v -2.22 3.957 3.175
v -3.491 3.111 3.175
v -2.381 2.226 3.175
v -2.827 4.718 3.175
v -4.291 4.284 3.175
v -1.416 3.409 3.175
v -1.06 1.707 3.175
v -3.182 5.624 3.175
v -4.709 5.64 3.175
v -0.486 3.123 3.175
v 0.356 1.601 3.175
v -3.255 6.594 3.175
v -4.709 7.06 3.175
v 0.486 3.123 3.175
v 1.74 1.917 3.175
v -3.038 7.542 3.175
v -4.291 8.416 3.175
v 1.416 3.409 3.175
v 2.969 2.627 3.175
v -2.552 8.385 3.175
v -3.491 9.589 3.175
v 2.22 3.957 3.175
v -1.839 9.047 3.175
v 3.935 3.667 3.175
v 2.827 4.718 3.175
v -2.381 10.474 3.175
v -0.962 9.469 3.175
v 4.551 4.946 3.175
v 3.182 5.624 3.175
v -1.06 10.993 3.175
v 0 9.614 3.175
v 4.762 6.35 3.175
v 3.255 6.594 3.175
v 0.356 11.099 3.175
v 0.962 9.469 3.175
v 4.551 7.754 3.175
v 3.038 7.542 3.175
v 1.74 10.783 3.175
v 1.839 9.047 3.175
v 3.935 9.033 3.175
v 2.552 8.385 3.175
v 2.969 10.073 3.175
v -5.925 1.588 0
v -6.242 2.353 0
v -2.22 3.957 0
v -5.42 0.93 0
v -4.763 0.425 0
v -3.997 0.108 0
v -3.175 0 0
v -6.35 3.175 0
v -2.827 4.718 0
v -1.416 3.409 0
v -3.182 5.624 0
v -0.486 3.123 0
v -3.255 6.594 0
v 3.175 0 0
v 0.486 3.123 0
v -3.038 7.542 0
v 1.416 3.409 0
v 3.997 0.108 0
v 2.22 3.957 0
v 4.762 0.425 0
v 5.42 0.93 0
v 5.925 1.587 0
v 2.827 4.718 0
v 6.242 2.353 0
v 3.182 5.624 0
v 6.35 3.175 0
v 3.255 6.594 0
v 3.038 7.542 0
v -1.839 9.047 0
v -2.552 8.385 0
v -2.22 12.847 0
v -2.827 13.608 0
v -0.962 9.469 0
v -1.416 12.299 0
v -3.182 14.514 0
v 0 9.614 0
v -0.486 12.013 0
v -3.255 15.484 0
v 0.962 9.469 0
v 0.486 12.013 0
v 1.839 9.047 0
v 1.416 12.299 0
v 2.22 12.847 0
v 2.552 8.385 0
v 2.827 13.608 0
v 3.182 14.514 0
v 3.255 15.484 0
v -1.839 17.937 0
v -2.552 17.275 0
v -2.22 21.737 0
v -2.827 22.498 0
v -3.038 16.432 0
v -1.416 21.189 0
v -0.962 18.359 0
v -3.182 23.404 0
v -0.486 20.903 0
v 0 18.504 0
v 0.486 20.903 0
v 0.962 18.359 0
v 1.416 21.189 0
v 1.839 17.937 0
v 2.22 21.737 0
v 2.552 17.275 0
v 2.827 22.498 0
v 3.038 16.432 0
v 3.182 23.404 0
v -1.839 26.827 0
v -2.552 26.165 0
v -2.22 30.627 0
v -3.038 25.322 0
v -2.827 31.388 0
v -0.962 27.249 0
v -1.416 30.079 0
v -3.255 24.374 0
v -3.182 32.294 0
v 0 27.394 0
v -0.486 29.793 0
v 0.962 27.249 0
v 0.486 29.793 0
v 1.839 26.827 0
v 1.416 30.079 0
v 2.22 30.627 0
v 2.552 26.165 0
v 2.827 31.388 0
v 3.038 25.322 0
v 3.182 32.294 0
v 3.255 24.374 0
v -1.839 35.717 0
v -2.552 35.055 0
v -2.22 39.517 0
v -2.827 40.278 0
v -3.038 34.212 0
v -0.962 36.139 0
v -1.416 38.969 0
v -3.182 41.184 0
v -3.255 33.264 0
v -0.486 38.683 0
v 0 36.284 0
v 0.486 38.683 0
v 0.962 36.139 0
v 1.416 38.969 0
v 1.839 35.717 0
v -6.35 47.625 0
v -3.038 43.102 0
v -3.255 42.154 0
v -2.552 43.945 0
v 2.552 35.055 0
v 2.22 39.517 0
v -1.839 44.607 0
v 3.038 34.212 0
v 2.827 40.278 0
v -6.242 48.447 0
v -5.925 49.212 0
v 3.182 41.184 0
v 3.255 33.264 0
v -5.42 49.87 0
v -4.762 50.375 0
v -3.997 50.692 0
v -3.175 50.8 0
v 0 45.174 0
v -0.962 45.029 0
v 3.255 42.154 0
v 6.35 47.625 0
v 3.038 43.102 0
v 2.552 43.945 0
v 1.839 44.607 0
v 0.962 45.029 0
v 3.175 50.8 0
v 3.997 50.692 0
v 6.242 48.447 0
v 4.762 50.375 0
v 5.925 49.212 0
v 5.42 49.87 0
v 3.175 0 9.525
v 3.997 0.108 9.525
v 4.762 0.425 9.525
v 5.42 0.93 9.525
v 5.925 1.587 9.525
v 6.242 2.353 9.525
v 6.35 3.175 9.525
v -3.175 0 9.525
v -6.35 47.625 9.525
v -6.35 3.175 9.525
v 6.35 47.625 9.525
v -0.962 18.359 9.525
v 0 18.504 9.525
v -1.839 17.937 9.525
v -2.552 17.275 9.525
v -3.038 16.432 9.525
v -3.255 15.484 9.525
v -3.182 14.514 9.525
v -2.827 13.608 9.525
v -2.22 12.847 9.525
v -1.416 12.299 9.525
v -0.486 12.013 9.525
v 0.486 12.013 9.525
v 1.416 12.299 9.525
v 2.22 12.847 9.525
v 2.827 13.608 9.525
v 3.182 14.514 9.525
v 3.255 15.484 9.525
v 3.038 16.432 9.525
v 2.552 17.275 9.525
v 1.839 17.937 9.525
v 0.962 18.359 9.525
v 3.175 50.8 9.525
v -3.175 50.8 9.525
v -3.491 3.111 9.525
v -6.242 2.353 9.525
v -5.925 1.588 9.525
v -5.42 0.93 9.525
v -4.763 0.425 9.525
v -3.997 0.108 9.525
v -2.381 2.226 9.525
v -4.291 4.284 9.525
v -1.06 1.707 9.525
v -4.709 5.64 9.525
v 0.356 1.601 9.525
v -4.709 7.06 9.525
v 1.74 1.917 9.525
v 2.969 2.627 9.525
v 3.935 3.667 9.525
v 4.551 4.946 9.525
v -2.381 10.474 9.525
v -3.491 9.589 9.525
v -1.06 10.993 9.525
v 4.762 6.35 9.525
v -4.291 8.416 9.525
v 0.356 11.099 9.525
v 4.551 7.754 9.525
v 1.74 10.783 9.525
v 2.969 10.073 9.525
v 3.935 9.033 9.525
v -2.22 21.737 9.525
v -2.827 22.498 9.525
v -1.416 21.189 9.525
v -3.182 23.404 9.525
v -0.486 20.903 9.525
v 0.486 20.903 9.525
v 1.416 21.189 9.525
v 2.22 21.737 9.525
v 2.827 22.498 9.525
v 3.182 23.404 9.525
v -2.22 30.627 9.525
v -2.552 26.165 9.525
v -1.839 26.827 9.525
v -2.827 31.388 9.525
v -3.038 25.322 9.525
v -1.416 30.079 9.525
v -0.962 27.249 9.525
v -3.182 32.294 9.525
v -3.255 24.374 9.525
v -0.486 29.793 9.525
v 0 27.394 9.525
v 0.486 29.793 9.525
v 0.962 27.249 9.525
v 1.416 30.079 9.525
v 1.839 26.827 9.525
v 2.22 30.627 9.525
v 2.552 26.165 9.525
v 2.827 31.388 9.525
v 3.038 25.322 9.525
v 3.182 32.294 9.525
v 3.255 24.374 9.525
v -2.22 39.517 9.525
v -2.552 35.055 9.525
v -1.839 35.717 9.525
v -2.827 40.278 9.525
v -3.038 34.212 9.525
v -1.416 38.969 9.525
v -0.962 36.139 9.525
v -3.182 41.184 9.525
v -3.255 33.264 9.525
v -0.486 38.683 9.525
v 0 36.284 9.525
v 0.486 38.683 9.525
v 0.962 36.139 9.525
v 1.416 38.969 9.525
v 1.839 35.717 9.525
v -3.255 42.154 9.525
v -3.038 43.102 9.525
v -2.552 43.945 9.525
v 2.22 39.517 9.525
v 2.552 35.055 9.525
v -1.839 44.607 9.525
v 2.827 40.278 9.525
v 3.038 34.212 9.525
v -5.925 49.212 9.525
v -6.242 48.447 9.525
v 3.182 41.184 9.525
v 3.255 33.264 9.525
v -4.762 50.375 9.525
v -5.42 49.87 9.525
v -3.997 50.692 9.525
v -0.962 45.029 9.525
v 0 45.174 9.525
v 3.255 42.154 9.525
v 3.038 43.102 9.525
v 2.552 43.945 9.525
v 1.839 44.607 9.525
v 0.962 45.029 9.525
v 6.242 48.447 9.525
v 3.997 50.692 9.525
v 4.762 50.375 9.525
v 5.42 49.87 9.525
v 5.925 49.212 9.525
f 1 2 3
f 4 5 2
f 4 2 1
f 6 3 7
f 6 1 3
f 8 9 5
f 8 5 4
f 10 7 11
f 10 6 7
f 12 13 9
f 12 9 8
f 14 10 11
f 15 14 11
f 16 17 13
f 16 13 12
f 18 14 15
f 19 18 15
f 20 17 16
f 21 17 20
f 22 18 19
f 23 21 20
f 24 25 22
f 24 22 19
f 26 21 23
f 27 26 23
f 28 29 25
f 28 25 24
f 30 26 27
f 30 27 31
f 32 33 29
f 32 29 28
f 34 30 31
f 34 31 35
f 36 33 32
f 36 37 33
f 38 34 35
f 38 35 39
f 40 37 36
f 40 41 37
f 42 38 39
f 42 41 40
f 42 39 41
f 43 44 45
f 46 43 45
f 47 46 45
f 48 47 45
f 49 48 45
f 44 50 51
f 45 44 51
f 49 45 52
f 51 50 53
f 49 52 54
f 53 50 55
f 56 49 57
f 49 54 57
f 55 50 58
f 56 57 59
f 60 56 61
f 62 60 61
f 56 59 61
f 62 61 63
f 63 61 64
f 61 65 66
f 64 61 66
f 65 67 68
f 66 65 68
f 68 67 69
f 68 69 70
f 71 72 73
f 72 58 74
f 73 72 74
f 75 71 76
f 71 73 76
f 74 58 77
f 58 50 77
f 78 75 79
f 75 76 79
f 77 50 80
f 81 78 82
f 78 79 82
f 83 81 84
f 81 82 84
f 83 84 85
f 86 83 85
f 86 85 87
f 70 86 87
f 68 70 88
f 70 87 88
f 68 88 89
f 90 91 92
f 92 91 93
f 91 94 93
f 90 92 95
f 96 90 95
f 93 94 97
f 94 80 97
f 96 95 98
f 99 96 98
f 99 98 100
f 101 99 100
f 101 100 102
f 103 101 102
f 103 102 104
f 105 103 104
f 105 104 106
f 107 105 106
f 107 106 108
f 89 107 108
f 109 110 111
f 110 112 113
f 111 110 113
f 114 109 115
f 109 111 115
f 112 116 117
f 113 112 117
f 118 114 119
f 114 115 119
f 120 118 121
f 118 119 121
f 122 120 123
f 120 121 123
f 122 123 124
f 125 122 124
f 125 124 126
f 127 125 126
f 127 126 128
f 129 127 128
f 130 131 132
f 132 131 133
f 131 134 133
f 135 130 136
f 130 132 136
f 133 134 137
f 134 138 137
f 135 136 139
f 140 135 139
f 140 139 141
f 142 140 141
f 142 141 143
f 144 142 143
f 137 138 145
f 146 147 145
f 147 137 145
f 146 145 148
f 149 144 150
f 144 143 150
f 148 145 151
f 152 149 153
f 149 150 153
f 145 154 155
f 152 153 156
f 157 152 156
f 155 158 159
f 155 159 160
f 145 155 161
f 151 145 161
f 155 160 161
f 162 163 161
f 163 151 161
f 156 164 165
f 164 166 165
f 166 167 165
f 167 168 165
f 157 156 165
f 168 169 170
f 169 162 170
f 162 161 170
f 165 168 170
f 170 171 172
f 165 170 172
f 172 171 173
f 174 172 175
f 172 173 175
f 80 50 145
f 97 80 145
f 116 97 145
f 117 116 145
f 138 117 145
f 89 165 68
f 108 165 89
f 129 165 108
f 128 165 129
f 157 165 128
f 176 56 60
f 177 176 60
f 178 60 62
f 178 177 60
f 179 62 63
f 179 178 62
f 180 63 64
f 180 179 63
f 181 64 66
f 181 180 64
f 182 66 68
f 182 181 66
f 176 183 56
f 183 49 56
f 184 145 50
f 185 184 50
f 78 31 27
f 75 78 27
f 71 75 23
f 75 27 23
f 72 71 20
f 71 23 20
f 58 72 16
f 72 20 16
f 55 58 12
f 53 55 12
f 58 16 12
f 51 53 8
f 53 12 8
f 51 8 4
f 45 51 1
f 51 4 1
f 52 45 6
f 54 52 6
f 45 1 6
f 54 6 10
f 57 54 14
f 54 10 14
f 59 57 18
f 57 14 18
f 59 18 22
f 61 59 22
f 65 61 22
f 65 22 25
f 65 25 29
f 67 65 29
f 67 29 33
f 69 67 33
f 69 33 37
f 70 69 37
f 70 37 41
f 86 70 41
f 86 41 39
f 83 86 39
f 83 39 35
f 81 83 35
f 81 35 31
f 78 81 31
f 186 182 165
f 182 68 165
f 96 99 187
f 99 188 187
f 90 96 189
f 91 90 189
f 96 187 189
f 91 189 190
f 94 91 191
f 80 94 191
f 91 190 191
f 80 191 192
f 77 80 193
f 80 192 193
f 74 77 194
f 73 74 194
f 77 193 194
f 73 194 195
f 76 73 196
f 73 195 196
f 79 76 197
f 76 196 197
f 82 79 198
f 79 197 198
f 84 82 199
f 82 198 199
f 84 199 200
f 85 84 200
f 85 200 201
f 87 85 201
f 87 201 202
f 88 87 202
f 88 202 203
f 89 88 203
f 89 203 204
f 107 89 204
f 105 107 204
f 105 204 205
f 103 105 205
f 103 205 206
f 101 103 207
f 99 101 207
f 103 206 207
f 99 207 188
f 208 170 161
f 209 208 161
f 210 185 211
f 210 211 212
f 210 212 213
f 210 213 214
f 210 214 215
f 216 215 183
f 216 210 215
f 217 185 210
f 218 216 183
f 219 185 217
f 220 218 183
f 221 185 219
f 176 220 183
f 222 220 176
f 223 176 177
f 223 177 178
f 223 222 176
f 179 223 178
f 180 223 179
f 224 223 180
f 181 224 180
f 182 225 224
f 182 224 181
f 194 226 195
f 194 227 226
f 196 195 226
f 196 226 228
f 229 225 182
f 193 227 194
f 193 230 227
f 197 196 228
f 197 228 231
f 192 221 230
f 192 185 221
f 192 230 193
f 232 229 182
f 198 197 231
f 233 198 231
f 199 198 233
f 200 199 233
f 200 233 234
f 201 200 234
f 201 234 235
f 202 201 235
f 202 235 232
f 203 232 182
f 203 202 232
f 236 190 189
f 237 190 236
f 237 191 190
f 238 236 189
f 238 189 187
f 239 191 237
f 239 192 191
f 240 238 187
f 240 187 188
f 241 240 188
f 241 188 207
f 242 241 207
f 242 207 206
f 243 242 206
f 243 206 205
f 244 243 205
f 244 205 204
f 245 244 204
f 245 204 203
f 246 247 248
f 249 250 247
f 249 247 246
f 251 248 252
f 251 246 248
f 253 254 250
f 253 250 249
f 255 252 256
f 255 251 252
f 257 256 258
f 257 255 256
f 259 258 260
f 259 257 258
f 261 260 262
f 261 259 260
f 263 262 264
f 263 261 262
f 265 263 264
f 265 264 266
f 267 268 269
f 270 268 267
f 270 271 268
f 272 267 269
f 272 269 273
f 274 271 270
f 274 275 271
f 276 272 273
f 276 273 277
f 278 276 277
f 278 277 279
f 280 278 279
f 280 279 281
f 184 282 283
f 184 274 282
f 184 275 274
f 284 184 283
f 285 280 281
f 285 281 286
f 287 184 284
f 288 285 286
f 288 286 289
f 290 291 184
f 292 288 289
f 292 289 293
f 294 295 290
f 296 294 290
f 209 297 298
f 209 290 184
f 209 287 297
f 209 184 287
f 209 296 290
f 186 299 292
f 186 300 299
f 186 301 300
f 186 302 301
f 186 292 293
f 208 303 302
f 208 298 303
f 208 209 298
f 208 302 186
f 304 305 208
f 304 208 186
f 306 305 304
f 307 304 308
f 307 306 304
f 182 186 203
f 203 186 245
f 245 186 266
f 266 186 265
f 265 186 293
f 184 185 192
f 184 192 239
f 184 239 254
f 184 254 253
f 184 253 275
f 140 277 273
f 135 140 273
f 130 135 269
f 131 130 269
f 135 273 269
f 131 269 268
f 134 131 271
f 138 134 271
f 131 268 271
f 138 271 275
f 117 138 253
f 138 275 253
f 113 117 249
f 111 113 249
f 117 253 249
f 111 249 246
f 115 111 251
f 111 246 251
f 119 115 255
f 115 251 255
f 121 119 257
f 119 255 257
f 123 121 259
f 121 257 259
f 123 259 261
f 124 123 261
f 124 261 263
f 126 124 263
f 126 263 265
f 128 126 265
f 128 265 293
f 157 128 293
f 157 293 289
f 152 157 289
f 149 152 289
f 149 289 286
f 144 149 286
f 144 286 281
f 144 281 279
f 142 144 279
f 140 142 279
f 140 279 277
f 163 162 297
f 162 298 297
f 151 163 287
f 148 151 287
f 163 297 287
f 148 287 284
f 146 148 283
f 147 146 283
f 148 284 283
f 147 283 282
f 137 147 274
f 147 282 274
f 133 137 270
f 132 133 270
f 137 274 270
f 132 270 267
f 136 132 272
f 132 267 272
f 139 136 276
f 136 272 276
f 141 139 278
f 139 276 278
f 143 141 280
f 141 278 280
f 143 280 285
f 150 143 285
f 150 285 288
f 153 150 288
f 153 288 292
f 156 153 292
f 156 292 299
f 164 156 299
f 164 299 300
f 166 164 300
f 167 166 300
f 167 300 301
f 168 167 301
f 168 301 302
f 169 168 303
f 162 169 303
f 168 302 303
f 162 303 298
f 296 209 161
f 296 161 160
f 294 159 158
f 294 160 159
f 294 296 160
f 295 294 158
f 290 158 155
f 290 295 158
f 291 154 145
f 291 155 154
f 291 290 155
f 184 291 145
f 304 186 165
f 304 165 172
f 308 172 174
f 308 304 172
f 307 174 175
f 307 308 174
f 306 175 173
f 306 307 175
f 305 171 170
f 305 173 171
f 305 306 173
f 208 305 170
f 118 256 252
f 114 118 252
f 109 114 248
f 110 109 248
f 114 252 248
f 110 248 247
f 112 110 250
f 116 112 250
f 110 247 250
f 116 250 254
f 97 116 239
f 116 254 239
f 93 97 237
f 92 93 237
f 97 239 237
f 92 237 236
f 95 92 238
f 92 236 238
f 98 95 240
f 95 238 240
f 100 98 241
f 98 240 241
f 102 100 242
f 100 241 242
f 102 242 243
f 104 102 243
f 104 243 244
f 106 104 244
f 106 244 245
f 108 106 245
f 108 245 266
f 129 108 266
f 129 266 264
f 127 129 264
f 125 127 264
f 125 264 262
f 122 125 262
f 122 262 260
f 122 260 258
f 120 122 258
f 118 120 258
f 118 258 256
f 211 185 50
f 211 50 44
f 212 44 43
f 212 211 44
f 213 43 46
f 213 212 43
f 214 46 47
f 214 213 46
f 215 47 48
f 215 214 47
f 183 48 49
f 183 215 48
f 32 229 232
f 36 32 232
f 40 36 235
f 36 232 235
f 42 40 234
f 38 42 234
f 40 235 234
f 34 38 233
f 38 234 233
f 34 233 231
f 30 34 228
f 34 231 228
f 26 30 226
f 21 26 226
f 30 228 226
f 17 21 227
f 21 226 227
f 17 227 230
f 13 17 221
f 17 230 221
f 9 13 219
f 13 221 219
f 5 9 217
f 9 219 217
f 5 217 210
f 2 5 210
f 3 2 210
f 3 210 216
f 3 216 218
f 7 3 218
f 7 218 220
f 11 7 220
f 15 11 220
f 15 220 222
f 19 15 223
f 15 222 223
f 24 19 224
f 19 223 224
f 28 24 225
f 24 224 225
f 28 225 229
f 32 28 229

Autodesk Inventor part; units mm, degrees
ref_plane "YZ Plane" through (0, 0, 0) normal (1, 0, 0) x (0, 1, 0)
ref_plane "XZ Plane" through (0, 0, 0) normal (0, 1, 0) x (-1, 0, 0)
ref_plane "XY Plane" through (0, 0, 0) normal (0, 0, 1) x (1, 0, 0)
sketch "Sketch1" plane through (0, 0, 0) normal (0, 0, 1) x (1, 0, 0)
  line L0 (-6.35, 0) -> (6.35, 0)
  line L1 (6.35, 0) -> (6.35, 50.8)
  line L2 (6.35, 50.8) -> (-6.35, 50.8)
  line L3 (-6.35, 50.8) -> (-6.35, 0)
  point P0 (0, 0)
  dimension "d6" = 50.8
  dimension "d7" = 12.7
  dimension "d22" = 6.35
extrude "Stock Bar" add sketch "Sketch1" along normal blind 9.525
sketch "Sketch4" plane through (0, 0, 0) normal (0, 0, -1) x (-1, 0, 0)
  line L0 (6.35, 0) -> (-6.35, 0) projected
  line L1 (-6.35, 0) -> (-6.35, 50.8) projected
  point P0 (0, 0)
  point P1 (0, 6.35)
  dimension "d13" = 6.35
  dimension "d14" = 6.35
hole "Motor Hole" at (0, 6.35, 0) direction (0, 0, 1) diameter 6.5278 end through all
sketch "Sketch6" plane through (0, 0, 9.525) normal (0, 0, 1) x (1, 0, 0)
  circle A0 centre (0, 6.35) radius 3.2639 projected
  circle A1 centre (0, 6.35) radius 4.7625
  point P0 (0, 0)
  dimension "d25" = 9.525
extrude "Motor Hole Secondary" cut sketch "Sketch6" against normal blind 6.35
sketch "Sketch5" plane through (0, 0, 9.525) normal (0, 0, 1) x (1, 0, 0)
  line L0 (-6.35, 50.8) -> (-6.35, 0) projected
  line L1 (-6.35, 25.4) -> (6.35, 25.4) construction
  line L2 (6.35, 0) -> (6.35, 50.8) projected
  point P0 (0, 0)
fillet "Round Edges" radius 3.175 4 edges at (-6.35, 50.8, 4.7625) (6.35, 50.8, 4.7625) (6.35, 0, 4.7625) (-6.35, 0, 4.7625)
pattern_linear "Mounting Holes" count 5 spacing 8.89 along (0, 1, 0) of "Motor Hole"
sketch "Sketch7" plane through (0, 0, 9.525) normal (0, 0, 1) x (1, 0, 0)
  line L0 (-6.35, 47.625) -> (-6.35, 3.175) projected
  line L1 (-6.35, 25.4) -> (6.35, 25.4) construction
  line L2 (6.35, 3.175) -> (6.35, 47.625) projected
  line L3 (0, 25.4) -> (0, 0) construction
  line L4 (-3.175, 0) -> (3.175, 0) projected
properties part number "Arm" material "Aluminum 6061"
